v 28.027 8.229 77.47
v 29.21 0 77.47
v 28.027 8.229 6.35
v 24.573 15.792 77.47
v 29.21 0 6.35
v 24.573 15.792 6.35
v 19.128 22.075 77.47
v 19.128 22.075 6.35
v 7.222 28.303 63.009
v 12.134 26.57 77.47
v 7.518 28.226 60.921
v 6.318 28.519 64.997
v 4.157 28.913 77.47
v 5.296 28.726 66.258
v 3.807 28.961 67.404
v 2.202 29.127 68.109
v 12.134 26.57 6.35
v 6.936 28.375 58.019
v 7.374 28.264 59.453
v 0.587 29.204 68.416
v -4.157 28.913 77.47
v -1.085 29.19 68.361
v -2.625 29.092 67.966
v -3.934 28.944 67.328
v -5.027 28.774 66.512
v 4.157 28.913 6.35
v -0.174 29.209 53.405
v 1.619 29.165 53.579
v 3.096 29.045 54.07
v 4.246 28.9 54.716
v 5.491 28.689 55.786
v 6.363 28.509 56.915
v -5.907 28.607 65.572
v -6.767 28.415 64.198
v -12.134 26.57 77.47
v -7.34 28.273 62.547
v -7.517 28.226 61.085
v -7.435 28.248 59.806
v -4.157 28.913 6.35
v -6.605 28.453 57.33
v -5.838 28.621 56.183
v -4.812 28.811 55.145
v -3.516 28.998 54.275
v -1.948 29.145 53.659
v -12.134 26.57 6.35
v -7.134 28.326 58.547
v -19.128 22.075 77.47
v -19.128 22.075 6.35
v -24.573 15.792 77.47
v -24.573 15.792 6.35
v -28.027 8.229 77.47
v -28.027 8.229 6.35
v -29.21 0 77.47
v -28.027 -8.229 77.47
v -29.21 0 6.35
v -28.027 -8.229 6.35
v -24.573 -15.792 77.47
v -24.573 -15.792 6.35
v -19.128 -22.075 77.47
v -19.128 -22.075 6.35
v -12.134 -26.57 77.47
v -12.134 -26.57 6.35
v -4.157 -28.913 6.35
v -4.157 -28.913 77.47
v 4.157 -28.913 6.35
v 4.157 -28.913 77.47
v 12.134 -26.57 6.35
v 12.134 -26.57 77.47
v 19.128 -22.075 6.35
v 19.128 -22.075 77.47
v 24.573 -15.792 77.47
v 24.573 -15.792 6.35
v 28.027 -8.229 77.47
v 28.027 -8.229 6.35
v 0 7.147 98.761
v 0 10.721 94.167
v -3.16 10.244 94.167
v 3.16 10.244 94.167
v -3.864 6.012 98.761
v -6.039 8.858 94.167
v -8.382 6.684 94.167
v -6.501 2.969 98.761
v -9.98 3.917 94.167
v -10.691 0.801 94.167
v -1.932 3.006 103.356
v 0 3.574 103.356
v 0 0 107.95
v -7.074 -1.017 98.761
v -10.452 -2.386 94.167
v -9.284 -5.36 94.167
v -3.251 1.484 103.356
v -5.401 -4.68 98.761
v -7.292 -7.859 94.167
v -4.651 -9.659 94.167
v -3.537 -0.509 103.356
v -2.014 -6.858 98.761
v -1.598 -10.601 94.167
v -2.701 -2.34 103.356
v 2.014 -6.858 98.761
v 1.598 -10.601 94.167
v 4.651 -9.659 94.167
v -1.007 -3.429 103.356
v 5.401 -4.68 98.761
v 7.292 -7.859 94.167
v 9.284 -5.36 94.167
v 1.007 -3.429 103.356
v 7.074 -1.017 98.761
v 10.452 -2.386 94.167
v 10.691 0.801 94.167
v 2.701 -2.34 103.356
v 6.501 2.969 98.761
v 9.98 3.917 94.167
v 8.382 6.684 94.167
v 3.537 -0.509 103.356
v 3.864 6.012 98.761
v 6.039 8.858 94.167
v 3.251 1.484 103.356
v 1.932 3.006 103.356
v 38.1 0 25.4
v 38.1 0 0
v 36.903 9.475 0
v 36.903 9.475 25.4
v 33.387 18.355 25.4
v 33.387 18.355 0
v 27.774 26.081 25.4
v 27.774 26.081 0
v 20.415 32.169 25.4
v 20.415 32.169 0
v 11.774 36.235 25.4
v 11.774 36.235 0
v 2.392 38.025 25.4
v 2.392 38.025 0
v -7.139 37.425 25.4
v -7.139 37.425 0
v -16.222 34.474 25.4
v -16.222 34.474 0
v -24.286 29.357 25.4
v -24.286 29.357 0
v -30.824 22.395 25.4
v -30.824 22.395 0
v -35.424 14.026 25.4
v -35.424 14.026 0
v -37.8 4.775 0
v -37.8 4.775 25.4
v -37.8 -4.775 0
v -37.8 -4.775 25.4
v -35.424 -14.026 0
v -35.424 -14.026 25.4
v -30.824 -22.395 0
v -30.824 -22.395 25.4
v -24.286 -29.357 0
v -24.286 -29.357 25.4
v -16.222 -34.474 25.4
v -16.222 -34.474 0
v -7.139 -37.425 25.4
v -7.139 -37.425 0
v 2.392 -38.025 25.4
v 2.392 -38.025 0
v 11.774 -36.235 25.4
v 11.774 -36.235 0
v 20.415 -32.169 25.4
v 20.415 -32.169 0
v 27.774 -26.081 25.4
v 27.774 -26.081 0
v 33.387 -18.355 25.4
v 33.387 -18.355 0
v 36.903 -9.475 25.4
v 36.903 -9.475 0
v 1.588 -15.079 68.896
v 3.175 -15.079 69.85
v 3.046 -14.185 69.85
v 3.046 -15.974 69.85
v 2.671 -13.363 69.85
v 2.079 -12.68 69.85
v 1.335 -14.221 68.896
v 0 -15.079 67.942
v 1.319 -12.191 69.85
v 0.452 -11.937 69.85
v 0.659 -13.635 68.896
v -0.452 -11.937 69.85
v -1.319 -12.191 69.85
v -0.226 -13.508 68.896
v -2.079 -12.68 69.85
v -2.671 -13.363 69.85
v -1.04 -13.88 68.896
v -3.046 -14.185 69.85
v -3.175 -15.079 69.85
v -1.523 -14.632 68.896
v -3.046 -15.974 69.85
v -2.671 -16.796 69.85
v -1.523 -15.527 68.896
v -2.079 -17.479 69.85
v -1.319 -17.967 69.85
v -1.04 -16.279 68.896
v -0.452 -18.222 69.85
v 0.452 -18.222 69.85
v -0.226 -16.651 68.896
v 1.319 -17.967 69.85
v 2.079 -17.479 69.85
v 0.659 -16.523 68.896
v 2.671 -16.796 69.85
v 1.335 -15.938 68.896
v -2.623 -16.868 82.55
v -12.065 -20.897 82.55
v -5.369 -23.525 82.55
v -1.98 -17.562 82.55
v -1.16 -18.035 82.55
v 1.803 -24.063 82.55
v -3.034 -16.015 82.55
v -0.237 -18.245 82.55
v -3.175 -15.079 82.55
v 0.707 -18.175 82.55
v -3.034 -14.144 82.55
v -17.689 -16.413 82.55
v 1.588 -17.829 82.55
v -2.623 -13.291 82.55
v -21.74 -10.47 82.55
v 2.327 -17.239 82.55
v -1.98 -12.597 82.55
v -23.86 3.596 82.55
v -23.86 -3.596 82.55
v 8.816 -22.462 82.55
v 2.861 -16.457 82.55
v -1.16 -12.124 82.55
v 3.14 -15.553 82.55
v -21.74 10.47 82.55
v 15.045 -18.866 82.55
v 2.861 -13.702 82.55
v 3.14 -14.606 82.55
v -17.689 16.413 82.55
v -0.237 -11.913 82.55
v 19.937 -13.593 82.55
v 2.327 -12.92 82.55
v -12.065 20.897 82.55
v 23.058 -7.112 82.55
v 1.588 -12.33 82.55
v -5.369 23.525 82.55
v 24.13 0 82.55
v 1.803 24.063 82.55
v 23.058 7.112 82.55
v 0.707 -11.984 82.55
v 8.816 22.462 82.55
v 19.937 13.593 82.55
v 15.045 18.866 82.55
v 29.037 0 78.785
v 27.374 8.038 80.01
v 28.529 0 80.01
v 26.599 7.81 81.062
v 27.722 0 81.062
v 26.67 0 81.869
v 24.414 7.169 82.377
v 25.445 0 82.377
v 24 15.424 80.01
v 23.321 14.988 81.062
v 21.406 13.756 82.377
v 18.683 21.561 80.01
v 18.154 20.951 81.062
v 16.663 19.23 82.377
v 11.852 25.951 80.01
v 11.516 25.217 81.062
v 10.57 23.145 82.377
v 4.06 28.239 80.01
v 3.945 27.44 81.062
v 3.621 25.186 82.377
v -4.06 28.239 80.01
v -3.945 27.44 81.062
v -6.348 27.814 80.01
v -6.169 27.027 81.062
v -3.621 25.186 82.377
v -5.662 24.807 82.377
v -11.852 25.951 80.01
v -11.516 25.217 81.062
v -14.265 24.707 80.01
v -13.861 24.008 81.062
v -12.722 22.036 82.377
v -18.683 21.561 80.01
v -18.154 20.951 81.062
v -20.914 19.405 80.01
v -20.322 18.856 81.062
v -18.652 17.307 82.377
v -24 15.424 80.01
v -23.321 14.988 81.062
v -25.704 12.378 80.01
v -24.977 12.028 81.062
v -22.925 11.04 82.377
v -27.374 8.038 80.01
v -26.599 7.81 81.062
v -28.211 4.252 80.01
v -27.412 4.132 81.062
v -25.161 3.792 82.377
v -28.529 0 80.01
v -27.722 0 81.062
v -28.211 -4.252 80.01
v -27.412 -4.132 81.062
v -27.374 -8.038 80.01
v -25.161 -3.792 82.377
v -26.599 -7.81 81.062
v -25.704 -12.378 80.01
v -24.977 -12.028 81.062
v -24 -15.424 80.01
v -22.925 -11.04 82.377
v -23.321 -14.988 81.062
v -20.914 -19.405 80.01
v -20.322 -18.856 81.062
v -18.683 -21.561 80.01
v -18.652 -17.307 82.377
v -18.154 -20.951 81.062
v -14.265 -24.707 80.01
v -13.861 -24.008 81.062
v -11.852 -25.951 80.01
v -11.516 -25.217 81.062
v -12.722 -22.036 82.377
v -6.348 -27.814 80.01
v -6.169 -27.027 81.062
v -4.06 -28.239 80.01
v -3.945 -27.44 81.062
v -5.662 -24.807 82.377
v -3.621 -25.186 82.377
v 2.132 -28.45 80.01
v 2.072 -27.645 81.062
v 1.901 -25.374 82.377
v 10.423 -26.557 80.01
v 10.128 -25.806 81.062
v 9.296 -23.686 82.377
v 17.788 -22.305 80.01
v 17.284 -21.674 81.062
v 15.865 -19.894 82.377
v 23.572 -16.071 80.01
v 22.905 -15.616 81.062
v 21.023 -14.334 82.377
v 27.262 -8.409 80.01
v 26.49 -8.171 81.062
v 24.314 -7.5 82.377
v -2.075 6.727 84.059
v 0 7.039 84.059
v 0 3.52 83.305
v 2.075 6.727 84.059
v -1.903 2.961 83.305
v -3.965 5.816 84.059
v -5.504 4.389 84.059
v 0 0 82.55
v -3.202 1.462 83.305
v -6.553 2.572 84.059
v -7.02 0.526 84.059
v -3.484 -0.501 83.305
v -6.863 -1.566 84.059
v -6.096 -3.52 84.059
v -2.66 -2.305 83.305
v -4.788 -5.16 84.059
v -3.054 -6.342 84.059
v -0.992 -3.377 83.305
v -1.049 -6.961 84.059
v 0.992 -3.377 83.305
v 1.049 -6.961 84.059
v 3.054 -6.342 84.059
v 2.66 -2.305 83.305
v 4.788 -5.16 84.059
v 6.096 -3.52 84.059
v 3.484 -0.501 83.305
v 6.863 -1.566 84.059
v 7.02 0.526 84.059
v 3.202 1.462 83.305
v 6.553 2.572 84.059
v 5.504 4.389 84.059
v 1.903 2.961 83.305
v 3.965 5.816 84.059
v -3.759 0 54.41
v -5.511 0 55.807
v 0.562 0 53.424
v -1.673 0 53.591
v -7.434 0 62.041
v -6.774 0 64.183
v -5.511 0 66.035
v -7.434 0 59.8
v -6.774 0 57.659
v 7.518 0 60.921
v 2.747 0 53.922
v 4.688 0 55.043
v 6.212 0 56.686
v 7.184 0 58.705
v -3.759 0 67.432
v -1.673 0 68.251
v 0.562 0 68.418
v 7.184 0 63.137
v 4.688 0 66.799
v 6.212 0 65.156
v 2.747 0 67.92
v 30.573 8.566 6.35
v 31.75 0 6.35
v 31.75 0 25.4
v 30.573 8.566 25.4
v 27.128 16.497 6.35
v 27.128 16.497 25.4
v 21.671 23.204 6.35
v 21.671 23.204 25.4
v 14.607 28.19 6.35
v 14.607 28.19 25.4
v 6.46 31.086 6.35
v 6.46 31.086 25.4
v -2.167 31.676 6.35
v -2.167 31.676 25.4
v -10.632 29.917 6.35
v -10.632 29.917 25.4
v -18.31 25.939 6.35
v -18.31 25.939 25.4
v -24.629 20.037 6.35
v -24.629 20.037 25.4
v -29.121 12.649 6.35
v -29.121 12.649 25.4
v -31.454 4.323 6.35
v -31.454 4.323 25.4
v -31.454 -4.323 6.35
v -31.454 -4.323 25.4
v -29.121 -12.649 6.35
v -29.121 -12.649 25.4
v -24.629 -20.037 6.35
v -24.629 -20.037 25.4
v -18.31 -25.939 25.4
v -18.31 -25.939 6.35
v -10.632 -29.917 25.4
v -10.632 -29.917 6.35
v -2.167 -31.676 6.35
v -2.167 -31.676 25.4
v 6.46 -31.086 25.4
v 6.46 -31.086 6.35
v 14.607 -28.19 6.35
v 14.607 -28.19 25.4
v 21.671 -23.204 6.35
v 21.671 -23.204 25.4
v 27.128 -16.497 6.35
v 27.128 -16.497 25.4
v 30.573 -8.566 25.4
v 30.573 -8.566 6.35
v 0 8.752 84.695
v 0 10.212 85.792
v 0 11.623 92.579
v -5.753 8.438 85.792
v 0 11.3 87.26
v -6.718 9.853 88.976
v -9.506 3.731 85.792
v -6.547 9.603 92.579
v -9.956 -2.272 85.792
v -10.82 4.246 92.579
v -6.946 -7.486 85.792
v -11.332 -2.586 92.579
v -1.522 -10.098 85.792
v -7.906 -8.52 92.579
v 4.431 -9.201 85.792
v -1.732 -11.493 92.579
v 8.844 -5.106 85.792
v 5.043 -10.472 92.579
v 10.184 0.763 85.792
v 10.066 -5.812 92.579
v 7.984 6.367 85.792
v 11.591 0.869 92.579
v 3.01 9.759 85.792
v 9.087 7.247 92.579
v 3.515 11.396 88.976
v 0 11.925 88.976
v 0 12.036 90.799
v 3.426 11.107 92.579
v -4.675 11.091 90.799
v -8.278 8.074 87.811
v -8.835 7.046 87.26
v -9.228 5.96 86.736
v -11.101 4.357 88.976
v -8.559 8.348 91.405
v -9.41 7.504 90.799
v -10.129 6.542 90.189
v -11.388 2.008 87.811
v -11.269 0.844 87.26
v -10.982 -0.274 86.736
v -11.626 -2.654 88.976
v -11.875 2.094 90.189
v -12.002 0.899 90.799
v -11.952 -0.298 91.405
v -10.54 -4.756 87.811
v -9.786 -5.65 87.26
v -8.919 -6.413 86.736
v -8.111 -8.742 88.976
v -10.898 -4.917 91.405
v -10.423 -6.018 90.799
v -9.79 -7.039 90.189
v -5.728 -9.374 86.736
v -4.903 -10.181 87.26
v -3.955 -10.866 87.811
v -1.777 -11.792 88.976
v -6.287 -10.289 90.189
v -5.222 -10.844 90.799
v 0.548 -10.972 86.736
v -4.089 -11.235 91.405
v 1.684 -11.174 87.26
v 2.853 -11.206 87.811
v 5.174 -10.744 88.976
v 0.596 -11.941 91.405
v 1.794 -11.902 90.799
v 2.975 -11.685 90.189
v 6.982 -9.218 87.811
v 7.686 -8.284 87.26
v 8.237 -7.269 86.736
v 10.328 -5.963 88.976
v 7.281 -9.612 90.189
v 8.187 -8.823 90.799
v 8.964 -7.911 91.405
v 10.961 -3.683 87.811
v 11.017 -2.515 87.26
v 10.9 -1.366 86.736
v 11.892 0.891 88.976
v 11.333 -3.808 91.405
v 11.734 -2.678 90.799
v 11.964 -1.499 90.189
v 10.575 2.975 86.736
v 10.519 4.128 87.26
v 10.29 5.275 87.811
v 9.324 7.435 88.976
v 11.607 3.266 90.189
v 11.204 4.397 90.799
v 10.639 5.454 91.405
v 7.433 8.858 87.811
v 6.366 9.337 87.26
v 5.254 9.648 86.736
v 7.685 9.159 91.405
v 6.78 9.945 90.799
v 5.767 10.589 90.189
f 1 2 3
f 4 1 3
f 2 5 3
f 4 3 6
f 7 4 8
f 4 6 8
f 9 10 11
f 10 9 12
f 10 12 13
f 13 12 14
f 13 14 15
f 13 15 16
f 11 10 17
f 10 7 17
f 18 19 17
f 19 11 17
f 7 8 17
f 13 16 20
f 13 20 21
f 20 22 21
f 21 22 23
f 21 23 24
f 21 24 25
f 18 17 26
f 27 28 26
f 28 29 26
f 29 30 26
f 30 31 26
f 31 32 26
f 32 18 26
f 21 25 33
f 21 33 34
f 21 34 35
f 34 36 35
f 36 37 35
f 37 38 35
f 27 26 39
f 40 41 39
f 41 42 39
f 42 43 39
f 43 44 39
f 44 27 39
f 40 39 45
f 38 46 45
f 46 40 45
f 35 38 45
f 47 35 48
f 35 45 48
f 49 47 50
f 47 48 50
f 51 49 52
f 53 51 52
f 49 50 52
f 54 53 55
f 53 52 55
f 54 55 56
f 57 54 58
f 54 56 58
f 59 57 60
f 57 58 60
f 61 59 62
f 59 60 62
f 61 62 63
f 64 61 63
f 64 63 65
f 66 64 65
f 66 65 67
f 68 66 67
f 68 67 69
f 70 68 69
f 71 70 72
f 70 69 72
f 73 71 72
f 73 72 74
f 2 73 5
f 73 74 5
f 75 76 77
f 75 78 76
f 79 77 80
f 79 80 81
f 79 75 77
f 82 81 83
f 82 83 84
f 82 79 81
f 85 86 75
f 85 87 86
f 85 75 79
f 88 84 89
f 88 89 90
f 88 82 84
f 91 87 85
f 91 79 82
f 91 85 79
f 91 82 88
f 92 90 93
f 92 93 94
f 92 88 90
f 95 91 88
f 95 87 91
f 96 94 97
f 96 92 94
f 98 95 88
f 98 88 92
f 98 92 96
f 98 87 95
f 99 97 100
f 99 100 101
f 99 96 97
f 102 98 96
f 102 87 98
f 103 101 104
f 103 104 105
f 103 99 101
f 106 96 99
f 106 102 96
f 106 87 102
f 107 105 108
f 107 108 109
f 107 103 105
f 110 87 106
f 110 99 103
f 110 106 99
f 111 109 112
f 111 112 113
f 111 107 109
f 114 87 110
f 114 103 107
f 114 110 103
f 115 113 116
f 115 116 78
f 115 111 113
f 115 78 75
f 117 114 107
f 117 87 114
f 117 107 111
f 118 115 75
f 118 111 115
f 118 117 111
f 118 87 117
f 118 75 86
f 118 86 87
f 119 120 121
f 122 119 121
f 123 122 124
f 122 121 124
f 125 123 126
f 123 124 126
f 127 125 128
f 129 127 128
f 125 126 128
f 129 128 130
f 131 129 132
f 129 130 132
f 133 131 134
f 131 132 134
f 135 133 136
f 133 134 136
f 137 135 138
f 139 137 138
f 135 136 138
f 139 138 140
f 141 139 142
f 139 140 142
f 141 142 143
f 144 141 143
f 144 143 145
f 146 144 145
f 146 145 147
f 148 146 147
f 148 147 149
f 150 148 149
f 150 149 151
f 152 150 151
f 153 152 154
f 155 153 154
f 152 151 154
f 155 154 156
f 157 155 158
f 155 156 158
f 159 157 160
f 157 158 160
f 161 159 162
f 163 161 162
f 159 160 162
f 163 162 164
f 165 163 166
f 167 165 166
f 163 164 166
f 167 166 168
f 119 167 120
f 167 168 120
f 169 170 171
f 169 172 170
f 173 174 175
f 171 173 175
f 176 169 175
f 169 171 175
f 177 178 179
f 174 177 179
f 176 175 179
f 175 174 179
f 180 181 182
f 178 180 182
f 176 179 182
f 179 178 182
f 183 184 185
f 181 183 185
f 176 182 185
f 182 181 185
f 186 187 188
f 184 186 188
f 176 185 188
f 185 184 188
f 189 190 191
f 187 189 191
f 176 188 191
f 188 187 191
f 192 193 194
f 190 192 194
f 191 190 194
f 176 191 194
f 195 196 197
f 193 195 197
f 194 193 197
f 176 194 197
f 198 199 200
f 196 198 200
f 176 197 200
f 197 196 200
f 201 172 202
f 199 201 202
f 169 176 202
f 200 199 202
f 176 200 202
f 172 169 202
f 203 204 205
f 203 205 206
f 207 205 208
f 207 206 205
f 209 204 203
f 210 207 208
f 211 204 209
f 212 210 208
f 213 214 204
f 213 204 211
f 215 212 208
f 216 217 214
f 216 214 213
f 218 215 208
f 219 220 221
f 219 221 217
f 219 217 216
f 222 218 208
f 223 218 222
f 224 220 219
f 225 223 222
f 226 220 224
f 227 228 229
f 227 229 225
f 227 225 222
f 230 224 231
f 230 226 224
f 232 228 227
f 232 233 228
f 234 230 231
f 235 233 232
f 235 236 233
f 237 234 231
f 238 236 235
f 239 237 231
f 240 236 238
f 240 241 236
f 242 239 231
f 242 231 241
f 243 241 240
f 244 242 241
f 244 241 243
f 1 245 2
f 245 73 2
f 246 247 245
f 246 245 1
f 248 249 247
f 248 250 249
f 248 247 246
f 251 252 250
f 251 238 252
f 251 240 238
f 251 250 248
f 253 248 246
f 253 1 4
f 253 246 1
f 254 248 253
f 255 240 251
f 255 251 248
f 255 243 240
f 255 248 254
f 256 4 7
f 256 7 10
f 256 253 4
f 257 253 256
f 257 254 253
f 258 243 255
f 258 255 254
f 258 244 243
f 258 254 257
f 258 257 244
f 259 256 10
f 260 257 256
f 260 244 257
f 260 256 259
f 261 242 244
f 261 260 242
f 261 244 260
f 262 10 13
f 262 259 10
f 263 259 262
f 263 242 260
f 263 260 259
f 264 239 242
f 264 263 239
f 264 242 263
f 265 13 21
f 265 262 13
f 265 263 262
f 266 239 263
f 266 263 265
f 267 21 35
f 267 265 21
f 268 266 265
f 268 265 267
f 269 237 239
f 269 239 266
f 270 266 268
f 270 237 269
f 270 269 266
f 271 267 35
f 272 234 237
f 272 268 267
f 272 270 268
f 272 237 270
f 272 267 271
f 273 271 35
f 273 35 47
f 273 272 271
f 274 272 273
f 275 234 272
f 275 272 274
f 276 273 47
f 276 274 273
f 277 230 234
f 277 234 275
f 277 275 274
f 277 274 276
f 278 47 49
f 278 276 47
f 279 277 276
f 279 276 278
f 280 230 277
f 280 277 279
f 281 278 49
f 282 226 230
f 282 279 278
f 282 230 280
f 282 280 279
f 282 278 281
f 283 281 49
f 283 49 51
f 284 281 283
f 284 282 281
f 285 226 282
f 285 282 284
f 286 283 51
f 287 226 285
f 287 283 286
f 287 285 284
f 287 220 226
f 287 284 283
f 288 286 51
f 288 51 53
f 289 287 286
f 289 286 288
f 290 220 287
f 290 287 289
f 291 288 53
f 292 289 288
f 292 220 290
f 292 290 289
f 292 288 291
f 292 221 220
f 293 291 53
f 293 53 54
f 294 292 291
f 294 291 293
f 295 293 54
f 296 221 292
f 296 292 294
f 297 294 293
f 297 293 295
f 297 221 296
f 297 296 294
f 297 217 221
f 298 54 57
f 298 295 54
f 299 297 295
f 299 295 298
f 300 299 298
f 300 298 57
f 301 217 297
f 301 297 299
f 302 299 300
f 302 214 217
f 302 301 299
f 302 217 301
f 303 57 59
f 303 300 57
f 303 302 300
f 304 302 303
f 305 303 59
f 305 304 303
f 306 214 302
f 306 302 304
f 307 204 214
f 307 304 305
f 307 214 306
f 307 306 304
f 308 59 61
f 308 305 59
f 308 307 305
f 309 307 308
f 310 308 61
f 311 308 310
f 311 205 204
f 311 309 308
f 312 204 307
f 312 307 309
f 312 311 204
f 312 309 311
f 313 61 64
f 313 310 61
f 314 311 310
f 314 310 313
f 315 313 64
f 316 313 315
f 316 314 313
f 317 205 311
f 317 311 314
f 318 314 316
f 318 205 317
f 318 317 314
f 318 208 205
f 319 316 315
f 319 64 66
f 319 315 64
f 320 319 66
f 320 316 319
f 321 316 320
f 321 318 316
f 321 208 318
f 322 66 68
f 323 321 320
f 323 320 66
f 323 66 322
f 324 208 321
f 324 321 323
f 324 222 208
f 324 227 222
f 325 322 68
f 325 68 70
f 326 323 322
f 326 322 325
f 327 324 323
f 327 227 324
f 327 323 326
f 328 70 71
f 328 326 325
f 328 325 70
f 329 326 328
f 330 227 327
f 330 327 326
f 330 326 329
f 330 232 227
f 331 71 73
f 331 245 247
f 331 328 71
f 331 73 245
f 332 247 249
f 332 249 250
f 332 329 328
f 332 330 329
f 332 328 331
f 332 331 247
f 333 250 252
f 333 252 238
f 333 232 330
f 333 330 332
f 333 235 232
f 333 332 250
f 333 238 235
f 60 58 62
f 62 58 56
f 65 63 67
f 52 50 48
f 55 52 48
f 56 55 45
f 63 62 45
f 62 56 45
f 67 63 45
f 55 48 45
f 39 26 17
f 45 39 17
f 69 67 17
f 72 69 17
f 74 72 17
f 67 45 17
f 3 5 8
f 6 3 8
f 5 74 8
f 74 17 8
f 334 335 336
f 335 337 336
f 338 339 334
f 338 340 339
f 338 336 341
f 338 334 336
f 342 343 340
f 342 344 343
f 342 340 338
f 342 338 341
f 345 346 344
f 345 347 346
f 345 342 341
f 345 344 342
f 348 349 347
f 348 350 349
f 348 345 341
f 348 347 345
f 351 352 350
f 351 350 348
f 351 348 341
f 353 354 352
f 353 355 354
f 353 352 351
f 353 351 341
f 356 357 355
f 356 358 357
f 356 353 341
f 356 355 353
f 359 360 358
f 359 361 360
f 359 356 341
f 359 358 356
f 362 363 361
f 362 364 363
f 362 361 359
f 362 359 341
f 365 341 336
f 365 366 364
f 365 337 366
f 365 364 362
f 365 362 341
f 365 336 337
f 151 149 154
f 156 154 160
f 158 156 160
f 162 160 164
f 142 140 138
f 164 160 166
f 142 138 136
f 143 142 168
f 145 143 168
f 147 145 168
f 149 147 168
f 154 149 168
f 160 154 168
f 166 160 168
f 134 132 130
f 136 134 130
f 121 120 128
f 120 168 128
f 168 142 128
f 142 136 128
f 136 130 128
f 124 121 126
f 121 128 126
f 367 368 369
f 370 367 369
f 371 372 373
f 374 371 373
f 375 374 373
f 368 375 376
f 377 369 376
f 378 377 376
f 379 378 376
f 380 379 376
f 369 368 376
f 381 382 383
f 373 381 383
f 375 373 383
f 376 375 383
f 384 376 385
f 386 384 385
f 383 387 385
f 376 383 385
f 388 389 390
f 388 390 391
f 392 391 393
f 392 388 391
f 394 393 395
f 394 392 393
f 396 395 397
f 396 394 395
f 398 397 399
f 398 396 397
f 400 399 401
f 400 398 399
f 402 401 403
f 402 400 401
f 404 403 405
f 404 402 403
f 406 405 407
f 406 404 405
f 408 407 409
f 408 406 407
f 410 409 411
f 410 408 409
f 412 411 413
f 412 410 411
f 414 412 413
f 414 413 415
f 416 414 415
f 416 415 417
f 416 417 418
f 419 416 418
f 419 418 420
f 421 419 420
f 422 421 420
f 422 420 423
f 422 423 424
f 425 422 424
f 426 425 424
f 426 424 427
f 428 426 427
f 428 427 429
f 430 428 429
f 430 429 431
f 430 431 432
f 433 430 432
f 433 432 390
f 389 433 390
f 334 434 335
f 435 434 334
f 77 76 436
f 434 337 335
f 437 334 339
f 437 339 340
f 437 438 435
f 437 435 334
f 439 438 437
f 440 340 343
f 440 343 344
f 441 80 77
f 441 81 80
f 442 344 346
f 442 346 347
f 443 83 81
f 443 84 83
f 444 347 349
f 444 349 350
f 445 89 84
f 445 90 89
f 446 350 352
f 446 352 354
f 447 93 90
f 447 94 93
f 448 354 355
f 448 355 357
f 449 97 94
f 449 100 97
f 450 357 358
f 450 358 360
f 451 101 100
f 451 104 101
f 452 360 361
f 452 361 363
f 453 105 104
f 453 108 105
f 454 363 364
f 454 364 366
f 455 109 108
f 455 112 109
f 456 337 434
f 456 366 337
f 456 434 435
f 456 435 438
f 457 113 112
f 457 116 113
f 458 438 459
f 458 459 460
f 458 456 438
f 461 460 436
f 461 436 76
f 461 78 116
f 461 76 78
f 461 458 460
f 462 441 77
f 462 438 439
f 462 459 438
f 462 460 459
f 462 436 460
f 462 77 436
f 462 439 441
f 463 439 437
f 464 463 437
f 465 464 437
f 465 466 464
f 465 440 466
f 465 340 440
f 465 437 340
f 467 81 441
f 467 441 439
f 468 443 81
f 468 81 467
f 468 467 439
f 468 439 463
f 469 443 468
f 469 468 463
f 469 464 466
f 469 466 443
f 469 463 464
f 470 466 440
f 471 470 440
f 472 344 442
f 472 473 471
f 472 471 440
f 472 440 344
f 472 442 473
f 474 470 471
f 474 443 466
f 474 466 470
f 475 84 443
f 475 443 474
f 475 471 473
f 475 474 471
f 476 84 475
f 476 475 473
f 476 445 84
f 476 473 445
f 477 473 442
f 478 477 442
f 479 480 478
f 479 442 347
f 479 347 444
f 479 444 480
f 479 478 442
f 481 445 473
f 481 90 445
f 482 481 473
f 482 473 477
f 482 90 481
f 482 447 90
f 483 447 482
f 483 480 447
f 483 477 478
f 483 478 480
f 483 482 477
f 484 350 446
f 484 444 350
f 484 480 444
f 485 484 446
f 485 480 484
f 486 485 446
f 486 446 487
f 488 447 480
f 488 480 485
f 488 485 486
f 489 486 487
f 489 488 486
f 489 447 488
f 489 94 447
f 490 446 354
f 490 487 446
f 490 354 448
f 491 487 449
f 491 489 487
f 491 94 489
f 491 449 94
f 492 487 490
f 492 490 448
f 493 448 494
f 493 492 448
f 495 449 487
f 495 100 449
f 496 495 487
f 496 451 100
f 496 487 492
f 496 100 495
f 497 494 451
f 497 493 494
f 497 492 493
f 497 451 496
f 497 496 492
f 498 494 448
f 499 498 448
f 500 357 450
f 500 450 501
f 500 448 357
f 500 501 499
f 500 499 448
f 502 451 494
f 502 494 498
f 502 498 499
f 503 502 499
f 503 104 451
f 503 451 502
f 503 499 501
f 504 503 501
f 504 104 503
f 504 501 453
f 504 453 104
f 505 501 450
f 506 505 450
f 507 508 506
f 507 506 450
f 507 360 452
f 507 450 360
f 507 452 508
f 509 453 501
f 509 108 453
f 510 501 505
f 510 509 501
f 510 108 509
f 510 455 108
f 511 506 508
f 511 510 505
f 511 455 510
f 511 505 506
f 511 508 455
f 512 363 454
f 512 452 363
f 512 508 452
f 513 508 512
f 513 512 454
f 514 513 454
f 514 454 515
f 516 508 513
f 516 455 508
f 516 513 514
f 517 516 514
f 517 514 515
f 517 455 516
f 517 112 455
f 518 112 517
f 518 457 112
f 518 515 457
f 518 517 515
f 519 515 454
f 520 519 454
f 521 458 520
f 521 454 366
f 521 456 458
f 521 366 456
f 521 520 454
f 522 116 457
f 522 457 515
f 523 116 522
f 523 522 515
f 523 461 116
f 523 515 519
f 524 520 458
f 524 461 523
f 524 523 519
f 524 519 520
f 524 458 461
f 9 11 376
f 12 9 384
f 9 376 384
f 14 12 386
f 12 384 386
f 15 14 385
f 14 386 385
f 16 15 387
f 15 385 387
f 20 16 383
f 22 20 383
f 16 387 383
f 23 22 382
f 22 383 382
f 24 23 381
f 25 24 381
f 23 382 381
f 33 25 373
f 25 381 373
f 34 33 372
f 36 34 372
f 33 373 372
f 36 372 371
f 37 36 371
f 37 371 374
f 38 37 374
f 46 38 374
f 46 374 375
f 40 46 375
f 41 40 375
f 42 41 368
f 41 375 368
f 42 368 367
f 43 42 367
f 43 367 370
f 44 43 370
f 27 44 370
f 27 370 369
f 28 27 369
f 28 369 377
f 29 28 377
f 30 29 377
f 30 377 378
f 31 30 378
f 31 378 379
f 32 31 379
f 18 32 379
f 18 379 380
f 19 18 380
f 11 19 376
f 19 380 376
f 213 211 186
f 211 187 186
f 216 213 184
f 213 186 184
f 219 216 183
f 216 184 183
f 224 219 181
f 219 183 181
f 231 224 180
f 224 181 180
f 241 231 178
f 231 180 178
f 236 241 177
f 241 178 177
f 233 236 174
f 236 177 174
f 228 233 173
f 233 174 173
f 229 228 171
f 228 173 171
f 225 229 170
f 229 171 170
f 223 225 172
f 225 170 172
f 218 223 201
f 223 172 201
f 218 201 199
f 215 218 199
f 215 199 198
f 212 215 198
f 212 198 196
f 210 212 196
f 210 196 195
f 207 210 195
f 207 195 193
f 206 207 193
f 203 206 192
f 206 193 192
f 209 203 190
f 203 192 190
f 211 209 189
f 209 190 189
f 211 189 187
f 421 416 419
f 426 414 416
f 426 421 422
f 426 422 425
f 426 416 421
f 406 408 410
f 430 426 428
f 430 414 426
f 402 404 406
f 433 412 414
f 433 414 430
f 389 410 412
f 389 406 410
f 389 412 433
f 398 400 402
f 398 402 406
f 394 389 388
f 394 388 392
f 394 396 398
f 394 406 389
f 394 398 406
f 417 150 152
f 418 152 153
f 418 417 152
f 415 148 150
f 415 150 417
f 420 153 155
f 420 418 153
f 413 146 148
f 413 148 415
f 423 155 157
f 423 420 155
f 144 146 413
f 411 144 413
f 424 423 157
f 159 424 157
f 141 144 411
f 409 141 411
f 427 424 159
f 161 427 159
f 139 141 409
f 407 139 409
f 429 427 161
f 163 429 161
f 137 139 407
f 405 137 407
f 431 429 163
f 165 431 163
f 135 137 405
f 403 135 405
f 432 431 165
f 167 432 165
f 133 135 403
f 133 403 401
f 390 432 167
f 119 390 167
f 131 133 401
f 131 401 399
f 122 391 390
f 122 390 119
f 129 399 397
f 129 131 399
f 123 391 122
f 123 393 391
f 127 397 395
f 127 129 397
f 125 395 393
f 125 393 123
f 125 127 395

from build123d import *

# Parameters (mm, degrees)
F0_R      = 31.75
F1_DEPTH  = 6.35
F0_R_2    = 38.1
F2_DEPTH  = 25.4
F3_R      = 29.21
F4_DEPTH  = 76.2
F7_R      = 5.08
F9_R      = 7.5183379437
F10_DEPTH = 76.2
F11_D     = 6.35
F11_DEPTH = 12.7
F11_TIP   = 1.9077324654


with BuildPart() as f1:
    # F0 (on Top) → F1 (new body)
    with BuildSketch(Plane.XY):
        Circle(F0_R)
    extrude(amount=F1_DEPTH)

    # F0 (on Top) → F2 (join)
    with BuildSketch(Plane.XY):
        Circle(F0_R_2)
        Circle(F0_R, mode=Mode.SUBTRACT)
    extrude(amount=F2_DEPTH)


with BuildPart() as f4:
    # F3 (on face) → F4 (new body)
    with BuildSketch(Plane.XY.offset(6.35)):
        Circle(F3_R)
    extrude(amount=F4_DEPTH)

    # F7
    f7_edges = [f4.edges().sort_by_distance(p)[0] for p in [
        (-29.21, 0, 82.55),
    ]]
    fillet(f7_edges, radius=F7_R)

    # F9 (on Front) → F10 (cut)
    with BuildSketch(Plane.XZ):
        with Locations((0, 60.9209239483)):
            Circle(F9_R)
    extrude(amount=-F10_DEPTH, mode=Mode.SUBTRACT)

    # F11
    with Locations(Plane.XY.offset(82.55)):
        with Locations((0, -15.0793576613)):
            Hole(F11_D / 2, depth=F11_DEPTH)
            with Locations((0, 0, -(F11_DEPTH + F11_TIP / 2))):  # 118° drill point
                Cone(0, F11_D / 2, F11_TIP, mode=Mode.SUBTRACT)


with BuildPart() as f6:
    # F5 (on Right) → F6 (revolve)
    with BuildSketch(Plane.YZ):
        with BuildLine():
            Line((0, 107.95), (0, 82.55))
            Line((0, 82.55), (7.0394309357, 84.0592574321))
            ThreePointArc((7.0394309357, 84.0592574321), (11.6748466424, 88.0951164777), (10.7205795649, 94.1667399307))
            Line((10.7205795649, 94.1667399307), (0, 107.95))
        make_face()
    revolve(axis=Axis((0, 0, 95.25), (0, 0, 1)))


solid = Compound([f1.part, f4.part, f6.part])
